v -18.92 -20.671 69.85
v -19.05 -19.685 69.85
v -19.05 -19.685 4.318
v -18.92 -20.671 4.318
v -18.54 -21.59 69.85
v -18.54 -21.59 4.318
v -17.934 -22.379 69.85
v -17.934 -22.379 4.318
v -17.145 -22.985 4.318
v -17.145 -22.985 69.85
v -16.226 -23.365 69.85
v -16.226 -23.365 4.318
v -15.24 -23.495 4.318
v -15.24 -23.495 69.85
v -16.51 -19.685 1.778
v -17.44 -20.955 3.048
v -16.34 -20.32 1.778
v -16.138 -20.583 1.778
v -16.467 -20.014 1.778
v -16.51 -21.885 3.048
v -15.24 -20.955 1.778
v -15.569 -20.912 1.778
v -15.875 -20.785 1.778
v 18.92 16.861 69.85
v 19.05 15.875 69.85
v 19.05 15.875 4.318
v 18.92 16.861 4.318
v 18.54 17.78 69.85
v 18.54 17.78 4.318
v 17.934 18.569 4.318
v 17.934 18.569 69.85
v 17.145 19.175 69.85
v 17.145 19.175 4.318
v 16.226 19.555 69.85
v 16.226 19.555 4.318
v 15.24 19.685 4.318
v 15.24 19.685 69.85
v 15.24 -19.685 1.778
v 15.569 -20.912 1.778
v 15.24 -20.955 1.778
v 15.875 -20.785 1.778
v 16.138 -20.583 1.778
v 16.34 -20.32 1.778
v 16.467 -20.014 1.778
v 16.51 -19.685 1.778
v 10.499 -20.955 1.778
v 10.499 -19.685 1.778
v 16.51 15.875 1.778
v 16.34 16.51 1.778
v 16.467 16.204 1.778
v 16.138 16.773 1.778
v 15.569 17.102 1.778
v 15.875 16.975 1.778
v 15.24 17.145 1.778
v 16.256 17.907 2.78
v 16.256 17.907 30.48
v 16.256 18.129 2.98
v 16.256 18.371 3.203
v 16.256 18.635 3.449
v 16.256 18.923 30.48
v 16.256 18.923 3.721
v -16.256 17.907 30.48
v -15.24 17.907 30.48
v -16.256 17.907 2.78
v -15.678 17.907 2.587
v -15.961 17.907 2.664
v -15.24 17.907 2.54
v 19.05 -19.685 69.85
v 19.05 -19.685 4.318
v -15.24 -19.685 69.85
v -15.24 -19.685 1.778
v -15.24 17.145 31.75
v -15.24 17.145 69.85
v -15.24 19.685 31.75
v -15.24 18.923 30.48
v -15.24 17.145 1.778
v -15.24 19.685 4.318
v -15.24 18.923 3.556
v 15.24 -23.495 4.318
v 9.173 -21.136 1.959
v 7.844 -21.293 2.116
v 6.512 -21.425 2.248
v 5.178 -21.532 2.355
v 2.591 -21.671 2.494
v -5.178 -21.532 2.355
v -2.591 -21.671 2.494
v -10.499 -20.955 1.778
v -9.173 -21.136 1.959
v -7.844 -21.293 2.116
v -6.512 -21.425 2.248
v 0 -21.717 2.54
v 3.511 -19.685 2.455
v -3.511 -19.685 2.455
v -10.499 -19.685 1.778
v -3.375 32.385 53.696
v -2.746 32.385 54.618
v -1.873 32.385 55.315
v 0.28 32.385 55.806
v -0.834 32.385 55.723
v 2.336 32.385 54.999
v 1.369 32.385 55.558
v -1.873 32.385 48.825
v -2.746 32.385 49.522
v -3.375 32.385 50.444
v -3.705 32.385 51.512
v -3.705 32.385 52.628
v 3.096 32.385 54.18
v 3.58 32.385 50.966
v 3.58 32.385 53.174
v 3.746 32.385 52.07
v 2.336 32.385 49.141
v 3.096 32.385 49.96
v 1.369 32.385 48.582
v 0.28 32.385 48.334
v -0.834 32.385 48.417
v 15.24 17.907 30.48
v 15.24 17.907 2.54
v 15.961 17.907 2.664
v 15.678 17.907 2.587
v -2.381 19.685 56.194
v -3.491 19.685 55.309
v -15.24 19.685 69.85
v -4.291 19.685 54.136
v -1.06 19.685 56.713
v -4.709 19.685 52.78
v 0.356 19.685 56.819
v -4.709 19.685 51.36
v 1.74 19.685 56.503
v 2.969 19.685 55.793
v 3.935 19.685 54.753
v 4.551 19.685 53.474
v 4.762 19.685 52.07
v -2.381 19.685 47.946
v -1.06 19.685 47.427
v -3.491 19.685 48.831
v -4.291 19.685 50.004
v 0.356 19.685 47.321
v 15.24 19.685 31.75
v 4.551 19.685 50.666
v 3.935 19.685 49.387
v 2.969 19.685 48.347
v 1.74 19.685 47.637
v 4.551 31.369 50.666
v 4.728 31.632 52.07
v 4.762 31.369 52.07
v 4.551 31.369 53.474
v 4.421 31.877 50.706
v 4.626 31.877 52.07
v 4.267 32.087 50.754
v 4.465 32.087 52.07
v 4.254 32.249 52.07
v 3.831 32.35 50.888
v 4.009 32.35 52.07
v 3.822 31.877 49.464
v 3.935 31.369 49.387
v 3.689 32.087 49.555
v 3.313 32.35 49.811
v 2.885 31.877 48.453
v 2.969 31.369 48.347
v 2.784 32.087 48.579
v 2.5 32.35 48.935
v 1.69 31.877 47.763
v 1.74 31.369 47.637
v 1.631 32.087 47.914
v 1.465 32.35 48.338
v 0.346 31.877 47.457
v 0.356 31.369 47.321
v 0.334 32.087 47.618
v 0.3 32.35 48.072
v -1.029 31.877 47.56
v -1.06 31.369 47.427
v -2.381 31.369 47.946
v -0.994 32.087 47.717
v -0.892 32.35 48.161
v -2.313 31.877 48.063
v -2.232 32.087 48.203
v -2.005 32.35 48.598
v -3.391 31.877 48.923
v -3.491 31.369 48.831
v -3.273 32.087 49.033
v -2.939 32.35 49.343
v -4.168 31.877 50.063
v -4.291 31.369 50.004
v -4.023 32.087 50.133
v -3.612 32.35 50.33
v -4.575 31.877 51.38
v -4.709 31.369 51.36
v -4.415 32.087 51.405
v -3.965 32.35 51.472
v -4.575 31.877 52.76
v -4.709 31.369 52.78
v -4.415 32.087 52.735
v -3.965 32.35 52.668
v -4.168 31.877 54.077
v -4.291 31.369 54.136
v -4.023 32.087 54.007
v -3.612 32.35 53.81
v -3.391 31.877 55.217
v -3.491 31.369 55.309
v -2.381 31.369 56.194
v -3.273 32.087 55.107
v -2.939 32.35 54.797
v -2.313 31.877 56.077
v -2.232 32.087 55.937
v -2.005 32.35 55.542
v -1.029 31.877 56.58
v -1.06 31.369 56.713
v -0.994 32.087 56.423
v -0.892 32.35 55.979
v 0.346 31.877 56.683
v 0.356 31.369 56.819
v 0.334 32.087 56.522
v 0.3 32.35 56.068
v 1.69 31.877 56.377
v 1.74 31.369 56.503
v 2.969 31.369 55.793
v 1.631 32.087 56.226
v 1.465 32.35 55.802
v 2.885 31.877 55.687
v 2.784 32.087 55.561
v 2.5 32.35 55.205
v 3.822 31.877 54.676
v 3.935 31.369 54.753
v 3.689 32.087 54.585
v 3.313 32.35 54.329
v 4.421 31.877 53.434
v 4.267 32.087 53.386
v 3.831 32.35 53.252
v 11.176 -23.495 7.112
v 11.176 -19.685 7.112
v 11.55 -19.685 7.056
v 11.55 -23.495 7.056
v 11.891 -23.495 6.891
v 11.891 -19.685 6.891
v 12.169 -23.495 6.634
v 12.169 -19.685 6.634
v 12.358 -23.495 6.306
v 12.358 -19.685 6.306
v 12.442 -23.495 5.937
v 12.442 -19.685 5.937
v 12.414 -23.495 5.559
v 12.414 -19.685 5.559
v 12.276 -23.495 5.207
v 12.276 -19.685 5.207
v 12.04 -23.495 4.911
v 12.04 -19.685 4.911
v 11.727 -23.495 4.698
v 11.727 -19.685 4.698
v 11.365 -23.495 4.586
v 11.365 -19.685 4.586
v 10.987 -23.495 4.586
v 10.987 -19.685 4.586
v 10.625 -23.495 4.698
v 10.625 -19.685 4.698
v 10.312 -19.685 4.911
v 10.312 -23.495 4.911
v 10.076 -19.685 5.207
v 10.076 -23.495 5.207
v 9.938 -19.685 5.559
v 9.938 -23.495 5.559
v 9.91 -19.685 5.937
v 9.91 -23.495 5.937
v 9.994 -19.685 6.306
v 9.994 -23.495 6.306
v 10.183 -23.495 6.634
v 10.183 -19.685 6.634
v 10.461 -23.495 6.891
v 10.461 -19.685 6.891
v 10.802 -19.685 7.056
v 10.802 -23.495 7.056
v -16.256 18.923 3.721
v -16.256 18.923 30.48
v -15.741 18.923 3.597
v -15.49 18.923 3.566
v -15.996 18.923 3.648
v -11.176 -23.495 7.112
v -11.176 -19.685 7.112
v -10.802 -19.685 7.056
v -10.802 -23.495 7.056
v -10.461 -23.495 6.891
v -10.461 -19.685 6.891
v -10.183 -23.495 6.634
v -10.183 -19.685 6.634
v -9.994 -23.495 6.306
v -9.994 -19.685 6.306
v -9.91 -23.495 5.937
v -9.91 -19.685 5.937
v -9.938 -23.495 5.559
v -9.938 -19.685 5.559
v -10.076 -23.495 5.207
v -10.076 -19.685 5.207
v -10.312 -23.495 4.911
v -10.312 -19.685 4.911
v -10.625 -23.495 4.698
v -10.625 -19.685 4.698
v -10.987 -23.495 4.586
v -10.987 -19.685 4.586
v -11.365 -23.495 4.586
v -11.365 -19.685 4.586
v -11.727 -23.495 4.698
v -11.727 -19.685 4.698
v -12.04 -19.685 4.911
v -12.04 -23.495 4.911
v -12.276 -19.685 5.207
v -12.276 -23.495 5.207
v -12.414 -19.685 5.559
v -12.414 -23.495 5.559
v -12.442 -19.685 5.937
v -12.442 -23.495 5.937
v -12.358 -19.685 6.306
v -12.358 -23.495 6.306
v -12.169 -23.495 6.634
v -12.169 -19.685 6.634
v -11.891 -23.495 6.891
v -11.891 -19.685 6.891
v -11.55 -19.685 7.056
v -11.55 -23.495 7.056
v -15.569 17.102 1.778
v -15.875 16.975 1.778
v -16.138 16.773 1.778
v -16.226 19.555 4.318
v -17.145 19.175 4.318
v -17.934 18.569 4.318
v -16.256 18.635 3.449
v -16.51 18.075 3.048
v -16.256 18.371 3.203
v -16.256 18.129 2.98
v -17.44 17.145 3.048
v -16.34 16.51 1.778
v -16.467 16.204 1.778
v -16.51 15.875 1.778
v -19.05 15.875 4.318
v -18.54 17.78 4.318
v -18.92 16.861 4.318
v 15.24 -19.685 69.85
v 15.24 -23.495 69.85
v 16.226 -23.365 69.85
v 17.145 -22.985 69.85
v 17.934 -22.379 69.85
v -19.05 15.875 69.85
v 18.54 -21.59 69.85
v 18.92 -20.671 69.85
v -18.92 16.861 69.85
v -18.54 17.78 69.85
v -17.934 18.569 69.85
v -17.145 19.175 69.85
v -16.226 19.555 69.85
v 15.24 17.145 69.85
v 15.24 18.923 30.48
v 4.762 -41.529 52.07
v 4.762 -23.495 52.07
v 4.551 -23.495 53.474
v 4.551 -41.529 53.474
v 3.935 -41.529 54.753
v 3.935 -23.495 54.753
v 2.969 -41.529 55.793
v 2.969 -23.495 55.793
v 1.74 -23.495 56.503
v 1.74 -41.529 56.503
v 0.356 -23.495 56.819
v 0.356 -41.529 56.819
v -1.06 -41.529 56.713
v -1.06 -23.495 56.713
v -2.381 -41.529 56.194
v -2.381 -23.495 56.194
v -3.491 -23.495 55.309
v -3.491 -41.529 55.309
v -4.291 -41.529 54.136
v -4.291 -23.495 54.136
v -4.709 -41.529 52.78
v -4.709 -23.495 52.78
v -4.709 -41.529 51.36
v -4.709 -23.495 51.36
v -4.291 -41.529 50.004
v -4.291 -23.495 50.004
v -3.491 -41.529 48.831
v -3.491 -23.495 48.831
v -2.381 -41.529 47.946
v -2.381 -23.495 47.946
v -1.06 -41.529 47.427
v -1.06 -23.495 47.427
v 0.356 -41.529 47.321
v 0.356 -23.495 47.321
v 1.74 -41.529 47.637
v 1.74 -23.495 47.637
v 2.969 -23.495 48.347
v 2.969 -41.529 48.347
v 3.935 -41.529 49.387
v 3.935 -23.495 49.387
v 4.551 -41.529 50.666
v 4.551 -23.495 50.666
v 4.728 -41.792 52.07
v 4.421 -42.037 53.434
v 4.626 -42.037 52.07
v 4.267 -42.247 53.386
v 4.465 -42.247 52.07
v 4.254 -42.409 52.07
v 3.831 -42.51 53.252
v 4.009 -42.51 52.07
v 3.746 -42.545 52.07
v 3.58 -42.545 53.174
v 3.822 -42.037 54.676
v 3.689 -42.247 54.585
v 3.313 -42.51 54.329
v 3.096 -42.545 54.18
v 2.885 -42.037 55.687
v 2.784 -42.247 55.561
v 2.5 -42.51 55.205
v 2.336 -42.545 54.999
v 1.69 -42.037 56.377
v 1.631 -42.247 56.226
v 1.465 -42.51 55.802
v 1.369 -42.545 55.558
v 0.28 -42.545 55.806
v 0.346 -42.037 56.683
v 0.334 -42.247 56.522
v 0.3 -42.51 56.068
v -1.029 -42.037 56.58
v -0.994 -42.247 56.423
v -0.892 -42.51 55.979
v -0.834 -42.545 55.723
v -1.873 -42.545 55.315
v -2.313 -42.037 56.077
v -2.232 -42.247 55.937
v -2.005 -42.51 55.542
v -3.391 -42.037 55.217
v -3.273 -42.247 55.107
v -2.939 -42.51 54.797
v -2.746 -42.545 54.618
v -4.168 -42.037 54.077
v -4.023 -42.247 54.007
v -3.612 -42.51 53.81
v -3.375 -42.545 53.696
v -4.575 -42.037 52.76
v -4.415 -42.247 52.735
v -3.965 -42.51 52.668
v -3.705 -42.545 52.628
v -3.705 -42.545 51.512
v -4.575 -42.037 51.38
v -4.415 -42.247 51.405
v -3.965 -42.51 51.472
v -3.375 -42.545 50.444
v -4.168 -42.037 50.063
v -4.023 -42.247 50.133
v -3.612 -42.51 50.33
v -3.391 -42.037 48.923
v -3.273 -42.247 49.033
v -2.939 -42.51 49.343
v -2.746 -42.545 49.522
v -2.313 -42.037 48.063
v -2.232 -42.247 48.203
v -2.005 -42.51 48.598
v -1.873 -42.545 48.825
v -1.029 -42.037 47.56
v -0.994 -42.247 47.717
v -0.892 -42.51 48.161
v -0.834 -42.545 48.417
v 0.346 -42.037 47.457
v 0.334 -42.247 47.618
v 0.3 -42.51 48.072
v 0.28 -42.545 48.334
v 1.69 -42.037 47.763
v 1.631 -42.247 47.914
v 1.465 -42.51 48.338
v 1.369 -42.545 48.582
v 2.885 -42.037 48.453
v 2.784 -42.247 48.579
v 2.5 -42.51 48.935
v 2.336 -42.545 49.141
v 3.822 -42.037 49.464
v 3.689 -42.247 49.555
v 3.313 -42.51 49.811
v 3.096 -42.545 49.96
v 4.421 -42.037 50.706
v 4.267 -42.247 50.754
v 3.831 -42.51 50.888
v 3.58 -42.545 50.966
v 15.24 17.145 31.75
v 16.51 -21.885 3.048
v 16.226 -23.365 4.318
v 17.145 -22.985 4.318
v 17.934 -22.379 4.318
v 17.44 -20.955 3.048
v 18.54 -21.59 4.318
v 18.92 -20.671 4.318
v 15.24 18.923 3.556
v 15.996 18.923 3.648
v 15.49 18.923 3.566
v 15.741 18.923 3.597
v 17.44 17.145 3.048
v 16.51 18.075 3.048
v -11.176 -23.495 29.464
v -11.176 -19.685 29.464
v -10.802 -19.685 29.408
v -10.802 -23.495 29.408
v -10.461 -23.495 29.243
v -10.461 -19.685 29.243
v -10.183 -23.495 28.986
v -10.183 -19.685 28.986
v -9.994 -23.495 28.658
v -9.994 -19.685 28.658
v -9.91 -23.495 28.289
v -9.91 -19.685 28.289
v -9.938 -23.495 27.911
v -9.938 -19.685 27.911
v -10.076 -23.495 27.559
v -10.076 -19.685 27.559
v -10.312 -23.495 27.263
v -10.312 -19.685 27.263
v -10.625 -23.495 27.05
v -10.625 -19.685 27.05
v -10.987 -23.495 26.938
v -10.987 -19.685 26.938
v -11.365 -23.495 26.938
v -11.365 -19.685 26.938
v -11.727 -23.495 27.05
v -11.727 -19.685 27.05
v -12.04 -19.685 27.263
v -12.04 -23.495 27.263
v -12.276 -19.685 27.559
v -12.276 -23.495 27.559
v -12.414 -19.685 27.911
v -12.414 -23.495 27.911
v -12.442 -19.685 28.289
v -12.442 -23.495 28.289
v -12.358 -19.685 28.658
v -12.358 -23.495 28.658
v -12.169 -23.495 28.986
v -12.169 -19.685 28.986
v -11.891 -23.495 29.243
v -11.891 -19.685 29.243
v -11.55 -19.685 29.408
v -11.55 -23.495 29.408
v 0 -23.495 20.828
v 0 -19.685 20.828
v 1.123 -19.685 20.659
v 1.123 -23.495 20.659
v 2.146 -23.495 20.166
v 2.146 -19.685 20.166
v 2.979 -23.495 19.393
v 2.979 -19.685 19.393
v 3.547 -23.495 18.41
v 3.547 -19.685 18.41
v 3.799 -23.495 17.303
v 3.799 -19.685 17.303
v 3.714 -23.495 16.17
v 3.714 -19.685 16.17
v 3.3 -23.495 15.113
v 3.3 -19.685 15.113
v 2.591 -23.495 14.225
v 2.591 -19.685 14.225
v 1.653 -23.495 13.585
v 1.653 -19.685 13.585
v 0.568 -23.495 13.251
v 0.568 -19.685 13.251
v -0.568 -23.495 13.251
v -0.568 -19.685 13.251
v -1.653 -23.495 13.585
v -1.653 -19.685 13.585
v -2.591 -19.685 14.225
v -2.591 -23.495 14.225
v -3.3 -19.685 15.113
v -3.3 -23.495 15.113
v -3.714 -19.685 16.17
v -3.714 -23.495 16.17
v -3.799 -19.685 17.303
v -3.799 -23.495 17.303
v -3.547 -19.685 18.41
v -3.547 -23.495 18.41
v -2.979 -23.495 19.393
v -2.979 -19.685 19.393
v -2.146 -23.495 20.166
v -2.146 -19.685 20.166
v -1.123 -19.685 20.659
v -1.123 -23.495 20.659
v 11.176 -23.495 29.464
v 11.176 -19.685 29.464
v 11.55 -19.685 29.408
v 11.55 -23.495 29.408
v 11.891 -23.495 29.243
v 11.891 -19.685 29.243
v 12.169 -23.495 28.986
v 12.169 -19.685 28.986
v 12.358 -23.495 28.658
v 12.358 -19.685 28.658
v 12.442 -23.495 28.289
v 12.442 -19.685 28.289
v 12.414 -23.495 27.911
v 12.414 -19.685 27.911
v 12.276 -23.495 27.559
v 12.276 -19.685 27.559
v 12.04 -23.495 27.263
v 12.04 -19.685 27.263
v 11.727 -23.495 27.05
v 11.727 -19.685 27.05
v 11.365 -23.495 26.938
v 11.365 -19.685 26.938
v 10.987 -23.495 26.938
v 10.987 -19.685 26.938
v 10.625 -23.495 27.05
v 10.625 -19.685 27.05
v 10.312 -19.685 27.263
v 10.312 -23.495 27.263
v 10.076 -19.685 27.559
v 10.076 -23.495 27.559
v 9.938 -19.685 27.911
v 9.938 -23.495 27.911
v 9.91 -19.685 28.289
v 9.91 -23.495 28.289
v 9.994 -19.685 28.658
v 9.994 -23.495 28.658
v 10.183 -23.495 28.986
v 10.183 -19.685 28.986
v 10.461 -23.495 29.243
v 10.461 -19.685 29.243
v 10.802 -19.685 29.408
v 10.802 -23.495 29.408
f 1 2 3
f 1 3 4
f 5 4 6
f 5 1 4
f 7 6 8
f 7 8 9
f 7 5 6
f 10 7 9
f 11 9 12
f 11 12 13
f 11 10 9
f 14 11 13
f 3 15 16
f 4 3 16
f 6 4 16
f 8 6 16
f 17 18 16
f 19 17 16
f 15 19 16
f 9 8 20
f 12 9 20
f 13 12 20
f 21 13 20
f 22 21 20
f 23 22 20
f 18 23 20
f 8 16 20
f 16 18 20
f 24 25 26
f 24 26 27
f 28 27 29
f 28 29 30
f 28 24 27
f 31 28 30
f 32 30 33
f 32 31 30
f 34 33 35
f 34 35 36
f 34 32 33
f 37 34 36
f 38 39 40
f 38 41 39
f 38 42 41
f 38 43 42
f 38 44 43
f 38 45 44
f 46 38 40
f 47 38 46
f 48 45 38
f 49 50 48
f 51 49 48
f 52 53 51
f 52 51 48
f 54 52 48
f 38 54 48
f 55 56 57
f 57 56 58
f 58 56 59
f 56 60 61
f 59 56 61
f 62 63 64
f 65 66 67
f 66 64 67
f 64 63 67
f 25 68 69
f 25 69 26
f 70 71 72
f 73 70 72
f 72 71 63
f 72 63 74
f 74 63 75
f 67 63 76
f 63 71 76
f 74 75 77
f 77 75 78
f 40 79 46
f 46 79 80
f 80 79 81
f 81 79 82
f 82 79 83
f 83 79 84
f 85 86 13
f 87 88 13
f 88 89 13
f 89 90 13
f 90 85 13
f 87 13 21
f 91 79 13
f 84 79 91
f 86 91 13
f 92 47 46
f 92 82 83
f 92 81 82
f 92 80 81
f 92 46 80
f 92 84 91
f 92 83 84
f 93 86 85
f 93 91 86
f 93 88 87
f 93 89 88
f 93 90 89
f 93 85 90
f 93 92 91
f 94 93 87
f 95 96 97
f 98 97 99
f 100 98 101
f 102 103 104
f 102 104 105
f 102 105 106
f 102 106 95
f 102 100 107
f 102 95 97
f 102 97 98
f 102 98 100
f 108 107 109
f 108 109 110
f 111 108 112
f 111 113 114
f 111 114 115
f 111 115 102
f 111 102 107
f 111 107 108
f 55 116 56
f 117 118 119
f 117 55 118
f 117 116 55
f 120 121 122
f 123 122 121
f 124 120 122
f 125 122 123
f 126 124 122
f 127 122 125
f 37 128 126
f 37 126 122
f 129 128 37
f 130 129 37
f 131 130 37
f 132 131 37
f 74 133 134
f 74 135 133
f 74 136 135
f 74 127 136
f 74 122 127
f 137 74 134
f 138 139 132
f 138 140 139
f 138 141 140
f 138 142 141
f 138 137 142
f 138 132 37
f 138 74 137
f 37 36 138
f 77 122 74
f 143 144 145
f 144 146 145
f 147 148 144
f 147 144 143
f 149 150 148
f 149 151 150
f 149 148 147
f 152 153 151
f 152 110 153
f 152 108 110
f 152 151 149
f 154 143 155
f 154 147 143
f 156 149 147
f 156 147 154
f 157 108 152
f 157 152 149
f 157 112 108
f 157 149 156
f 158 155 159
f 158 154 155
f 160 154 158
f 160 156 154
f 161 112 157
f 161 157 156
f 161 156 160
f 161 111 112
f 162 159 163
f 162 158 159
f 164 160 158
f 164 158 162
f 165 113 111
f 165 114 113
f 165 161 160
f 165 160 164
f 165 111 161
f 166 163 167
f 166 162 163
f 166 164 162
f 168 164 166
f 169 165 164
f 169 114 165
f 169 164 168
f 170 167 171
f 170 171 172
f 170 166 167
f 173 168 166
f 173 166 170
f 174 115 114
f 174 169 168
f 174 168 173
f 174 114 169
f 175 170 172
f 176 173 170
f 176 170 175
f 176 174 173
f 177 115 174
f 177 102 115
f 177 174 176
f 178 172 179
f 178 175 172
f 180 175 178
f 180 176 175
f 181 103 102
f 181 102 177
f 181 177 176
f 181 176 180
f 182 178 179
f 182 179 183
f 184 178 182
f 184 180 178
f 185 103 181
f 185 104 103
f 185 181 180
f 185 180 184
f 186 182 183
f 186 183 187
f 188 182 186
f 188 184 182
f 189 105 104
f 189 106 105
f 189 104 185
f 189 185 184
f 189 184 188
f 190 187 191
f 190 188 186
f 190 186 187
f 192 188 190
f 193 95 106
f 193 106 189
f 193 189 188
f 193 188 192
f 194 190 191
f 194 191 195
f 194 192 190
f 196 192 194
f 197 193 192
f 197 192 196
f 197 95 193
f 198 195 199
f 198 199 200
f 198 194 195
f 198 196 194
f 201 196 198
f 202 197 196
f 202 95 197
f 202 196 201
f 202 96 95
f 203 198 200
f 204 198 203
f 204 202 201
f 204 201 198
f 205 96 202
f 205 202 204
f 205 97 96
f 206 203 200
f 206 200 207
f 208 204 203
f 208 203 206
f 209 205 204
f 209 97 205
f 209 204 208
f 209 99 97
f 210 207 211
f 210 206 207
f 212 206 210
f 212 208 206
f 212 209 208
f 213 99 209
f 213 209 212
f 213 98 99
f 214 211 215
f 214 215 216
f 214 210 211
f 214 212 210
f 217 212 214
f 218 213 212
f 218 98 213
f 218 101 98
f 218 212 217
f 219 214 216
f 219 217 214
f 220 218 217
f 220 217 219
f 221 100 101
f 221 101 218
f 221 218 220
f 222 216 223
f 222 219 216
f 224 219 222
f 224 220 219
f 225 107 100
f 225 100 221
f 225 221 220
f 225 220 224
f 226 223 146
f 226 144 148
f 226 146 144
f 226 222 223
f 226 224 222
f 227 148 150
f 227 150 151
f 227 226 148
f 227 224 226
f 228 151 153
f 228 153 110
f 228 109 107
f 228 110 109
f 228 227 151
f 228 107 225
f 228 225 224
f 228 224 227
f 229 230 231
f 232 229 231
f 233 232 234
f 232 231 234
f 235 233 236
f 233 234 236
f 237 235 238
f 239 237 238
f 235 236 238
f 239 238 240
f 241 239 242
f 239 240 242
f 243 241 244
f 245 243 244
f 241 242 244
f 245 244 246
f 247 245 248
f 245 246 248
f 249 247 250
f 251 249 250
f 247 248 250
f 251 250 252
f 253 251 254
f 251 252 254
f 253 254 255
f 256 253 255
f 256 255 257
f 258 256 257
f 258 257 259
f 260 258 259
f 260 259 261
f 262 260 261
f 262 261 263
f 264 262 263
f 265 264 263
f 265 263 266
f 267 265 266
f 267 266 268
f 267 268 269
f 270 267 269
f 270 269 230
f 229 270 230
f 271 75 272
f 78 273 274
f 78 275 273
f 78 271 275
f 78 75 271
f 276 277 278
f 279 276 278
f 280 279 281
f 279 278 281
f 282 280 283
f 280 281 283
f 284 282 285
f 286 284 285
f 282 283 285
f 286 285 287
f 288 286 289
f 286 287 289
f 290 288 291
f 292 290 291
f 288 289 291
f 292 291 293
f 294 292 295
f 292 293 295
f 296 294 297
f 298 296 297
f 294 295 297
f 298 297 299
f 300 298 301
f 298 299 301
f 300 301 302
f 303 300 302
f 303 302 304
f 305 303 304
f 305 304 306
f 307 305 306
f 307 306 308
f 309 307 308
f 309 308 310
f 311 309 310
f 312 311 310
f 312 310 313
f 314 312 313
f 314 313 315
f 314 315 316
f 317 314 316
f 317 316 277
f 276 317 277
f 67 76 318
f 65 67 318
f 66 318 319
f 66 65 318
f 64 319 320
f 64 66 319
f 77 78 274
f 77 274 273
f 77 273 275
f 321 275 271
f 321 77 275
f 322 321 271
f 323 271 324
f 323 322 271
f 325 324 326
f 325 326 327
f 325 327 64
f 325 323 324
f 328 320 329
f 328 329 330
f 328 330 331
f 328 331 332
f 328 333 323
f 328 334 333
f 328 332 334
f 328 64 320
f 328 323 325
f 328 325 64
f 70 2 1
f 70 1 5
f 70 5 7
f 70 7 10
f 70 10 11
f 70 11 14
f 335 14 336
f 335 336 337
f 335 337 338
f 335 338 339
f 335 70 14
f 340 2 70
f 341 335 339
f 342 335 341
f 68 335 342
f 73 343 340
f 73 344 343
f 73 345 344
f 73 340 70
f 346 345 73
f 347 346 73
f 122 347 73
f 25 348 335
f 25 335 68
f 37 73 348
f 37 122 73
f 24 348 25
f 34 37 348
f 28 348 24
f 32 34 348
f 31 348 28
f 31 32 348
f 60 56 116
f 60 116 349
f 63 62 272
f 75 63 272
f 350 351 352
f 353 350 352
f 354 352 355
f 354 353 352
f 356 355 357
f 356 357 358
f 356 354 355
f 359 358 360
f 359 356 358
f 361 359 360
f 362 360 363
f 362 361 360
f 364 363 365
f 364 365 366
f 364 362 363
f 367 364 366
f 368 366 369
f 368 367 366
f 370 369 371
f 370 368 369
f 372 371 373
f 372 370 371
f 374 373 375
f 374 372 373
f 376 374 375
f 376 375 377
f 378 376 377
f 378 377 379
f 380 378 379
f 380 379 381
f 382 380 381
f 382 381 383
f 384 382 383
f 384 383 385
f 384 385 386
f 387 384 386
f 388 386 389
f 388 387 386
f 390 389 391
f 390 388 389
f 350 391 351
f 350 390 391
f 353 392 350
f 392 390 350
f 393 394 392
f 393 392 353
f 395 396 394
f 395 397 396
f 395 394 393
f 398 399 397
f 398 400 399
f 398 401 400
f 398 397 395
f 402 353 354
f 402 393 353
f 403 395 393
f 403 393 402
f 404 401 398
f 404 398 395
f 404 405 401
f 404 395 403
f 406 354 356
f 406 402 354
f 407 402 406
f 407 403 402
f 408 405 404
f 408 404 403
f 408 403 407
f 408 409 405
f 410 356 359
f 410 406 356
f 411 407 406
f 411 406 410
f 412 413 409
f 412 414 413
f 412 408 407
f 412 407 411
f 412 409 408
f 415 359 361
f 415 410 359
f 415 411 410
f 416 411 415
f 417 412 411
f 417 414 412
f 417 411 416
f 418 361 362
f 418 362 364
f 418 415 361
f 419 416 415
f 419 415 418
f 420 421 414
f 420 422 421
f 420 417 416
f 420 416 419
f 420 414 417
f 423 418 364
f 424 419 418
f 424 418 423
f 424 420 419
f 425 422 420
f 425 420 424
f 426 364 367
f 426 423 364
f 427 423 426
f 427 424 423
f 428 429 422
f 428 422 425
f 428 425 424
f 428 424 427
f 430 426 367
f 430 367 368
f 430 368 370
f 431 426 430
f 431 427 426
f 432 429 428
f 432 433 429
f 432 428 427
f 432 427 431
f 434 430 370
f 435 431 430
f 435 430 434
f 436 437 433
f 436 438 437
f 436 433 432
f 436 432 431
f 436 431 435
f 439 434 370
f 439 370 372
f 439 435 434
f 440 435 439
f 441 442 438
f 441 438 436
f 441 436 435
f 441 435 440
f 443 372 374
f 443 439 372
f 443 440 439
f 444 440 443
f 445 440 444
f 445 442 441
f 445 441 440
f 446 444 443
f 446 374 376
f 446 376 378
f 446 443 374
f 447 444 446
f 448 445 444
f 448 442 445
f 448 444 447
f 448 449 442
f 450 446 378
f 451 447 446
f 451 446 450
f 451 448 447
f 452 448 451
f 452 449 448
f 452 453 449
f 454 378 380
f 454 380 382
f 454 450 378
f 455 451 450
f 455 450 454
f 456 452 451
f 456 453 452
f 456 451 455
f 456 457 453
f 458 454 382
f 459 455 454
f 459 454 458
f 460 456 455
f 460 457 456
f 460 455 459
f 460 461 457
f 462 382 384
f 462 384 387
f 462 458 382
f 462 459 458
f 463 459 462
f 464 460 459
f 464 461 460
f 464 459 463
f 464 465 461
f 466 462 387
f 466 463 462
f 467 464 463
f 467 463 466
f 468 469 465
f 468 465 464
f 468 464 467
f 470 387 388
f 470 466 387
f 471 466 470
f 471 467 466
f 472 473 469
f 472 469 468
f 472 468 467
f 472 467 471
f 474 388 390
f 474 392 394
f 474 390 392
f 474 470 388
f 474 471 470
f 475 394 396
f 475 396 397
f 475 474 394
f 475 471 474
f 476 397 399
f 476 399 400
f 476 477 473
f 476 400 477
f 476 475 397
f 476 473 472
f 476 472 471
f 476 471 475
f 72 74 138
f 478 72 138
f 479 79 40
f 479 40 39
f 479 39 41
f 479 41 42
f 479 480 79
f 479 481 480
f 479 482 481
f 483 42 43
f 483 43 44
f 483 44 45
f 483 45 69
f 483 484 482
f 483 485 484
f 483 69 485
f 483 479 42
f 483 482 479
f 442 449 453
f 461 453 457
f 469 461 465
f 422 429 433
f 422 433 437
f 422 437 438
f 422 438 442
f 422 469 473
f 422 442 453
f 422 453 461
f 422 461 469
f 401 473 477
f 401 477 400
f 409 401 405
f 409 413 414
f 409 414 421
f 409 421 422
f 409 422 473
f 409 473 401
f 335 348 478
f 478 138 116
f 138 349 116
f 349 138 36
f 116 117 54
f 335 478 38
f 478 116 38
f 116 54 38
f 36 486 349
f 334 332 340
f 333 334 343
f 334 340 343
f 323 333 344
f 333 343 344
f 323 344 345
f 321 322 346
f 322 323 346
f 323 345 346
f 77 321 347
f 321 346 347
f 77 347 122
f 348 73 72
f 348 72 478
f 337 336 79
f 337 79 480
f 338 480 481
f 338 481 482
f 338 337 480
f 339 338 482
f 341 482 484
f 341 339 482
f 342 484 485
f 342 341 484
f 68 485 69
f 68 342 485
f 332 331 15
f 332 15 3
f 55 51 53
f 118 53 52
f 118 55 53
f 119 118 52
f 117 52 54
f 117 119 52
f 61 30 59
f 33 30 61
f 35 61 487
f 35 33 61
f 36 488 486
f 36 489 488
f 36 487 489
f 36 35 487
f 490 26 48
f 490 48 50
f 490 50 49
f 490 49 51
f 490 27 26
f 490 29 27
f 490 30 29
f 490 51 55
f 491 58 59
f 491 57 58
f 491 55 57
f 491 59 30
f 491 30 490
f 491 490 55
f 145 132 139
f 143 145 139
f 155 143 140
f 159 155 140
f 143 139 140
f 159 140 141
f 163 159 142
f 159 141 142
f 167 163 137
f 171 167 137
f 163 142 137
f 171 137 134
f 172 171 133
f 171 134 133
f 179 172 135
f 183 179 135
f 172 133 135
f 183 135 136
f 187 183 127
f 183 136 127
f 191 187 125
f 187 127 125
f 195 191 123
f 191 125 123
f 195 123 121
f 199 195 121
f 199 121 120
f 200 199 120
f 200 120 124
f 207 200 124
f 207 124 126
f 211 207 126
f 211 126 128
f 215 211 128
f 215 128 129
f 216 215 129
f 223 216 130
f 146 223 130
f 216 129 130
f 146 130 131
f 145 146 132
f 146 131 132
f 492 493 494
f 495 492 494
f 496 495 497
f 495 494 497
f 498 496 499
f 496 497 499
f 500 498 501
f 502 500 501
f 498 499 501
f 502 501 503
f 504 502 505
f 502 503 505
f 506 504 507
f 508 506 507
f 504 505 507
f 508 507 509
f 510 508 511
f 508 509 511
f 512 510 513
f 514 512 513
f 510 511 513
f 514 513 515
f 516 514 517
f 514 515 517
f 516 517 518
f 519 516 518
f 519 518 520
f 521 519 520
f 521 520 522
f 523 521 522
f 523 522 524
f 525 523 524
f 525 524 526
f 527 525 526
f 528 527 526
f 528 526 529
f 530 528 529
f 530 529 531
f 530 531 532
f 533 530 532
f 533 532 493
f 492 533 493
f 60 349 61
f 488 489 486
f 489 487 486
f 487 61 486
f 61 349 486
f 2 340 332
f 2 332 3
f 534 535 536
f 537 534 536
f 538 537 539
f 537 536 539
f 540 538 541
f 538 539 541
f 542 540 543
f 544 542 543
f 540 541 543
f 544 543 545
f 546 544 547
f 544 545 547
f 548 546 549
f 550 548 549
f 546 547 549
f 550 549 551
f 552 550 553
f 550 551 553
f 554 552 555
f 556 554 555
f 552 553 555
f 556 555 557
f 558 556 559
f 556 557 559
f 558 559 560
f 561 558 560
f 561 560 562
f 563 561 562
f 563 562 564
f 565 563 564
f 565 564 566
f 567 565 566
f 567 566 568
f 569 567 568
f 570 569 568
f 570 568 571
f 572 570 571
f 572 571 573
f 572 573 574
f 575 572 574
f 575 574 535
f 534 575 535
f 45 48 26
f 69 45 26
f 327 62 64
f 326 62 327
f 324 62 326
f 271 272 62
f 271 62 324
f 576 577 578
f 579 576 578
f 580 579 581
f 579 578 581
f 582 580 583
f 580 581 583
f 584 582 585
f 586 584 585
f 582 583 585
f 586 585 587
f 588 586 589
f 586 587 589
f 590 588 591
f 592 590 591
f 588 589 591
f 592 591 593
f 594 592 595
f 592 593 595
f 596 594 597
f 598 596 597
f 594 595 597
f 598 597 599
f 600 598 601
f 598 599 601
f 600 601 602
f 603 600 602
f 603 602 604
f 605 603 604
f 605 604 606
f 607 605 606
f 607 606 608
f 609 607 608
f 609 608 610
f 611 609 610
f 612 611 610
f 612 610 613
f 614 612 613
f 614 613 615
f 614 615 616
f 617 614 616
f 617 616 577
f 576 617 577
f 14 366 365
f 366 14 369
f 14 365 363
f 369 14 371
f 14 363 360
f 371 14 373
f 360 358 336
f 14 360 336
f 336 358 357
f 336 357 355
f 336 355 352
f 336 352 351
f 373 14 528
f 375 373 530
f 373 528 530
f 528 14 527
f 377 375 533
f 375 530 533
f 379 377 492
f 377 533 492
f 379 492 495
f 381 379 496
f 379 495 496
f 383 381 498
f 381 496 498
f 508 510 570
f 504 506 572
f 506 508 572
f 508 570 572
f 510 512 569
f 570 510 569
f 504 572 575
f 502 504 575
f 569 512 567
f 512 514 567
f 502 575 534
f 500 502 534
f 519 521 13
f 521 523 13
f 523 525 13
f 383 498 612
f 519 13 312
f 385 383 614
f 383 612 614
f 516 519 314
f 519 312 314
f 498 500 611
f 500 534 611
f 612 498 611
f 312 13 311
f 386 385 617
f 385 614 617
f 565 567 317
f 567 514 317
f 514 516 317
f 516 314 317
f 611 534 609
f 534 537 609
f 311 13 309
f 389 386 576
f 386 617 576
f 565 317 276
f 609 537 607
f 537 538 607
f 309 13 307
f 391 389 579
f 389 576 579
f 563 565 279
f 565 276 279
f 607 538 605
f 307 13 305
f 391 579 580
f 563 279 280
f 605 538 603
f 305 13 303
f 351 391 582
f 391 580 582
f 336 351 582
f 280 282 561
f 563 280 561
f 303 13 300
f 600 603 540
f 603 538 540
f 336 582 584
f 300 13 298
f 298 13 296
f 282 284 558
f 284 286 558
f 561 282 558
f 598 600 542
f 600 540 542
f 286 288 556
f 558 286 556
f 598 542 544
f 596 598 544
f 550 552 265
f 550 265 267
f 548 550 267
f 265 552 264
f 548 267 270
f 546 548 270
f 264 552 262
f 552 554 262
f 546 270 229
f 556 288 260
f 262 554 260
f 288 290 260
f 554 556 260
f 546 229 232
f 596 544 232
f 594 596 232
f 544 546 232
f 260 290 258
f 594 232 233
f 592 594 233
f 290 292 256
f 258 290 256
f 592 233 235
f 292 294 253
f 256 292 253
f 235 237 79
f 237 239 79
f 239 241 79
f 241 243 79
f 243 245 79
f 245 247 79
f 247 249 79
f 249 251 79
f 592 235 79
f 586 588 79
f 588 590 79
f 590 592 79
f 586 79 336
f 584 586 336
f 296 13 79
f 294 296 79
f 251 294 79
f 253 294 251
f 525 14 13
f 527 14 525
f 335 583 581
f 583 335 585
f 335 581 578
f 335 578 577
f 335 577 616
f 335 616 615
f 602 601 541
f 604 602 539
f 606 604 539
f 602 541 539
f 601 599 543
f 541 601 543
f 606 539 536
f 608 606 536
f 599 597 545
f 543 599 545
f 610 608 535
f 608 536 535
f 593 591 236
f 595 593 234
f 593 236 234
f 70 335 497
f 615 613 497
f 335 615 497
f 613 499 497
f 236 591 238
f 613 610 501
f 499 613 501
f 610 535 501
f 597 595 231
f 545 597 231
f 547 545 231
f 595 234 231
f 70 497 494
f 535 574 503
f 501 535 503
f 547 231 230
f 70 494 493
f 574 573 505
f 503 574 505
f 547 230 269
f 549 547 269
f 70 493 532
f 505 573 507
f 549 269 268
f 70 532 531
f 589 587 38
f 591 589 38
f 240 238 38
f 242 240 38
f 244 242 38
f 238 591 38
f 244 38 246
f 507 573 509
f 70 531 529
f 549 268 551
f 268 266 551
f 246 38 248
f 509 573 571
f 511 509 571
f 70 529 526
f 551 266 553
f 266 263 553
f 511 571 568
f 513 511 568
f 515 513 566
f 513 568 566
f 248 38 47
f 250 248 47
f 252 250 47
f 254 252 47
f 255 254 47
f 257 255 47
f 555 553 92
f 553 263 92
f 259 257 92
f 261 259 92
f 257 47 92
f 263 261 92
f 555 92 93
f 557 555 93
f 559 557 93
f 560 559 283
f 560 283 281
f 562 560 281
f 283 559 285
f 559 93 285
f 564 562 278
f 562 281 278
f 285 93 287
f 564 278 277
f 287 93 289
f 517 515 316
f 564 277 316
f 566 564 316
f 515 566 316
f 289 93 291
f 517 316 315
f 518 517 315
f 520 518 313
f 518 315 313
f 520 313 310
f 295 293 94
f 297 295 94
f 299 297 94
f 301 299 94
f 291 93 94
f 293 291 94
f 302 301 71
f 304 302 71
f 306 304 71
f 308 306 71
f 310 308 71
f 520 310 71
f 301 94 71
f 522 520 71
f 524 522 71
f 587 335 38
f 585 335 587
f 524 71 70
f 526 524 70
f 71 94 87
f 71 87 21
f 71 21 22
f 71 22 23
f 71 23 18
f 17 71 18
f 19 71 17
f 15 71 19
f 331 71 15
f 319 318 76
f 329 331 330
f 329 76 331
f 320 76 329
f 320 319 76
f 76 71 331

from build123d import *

# Parameters (mm, degrees)
BOSS_EXTRUDE1_DEPTH = 69.85
CUT_EXTRUDE1_DEPTH  = 50.8
SKETCH3_R           = 1.27
SKETCH3_R_2         = 3.81
CUT_EXTRUDE2_DEPTH  = 50.8
SKETCH4_W           = 30.48
SKETCH4_H           = 38.1
BOSS_EXTRUDE2_DEPTH = 2.54
SKETCH5_W           = 30.48
SKETCH5_H           = 1.016
CUT_EXTRUDE3_DEPTH  = 1.016
FILLET1_R           = 3.81
SKETCH6_R           = 4.7625
BOSS_EXTRUDE3_DEPTH = 12.7
BOSS_EXTRUDE4_START = 19.05
SKETCH8_R           = 4.7625
BOSS_EXTRUDE4_DEPTH = 19.05
FILLET2_R           = 1.016
SKETCH9_W           = 38.1
SKETCH9_H           = 43.18
CUT_EXTRUDE4_DEPTH  = 2.032


# Some blends are built 0.0001 mm under size
with BuildPart() as part:
    # Sketch1 → Boss-Extrude1 (new body)
    with BuildSketch(Plane.XY):
        Polygon((15.24, -19.685), (-15.24, -19.685), (-15.24, 19.685), (-19.05, 19.685), (-19.05, -23.495), (15.24, -23.495), (19.05, -23.495), (19.05, 19.685), (15.24, 19.685), align=None)
    extrude(amount=BOSS_EXTRUDE1_DEPTH)

    # Sketch2 → Cut-Extrude1 (cut)
    with BuildSketch(Plane(origin=(0, 19.685, 0), x_dir=(1, 0, 0), z_dir=(0, 1, 0))):
        with BuildLine():
            Line((-19.05, 0), (19.05, 0))
            ThreePointArc((19.05, 0), (0, -2.54), (-19.05, 0))
        make_face()
    extrude(amount=-CUT_EXTRUDE1_DEPTH, mode=Mode.SUBTRACT)

    # Sketch3 → Cut-Extrude2 (cut)
    with BuildSketch(Plane(origin=(0, 19.685, 0), x_dir=(1, 0, 0), z_dir=(0, 1, 0))):
        with Locations(Location((-11.176, -5.842, 0), (0, 0, 270))):
            Circle(SKETCH3_R)
        with Locations(Location((11.176, -5.842, 0), (0, 0, 270))):
            Circle(SKETCH3_R)
        with Locations(Location((11.176, -28.194, 0), (0, 0, 270))):
            Circle(SKETCH3_R)
        with Locations(Location((-11.176, -28.194, 0), (0, 0, 270))):
            Circle(SKETCH3_R)
        with Locations(Location((0, -17.018, 0), (0, 0, 270))):
            Circle(SKETCH3_R_2)
    extrude(amount=-CUT_EXTRUDE2_DEPTH, mode=Mode.SUBTRACT)

    # Sketch4 → Boss-Extrude2 (add)
    with BuildSketch(Plane(origin=(0, 19.685, 0), x_dir=(1, 0, 0), z_dir=(0, 1, 0))):
        with Locations((0, -50.8)):
            Rectangle(SKETCH4_W, SKETCH4_H)
    extrude(amount=-BOSS_EXTRUDE2_DEPTH)

    # Sketch5 → Cut-Extrude3 (cut)
    with BuildSketch(Plane(origin=(-15.24, 0, 0), x_dir=(0, 0, -1), z_dir=(1, 0, 0))):
        with Locations((-15.24, 18.415)):
            Rectangle(SKETCH5_W, SKETCH5_H)
    cut_extrude3 = extrude(amount=-CUT_EXTRUDE3_DEPTH, mode=Mode.SUBTRACT)

    # Mirror1: Cut-Extrude3 across plane
    add(cut_extrude3.mirror(Plane(origin=(0, 0, 0), x_dir=(0, 0, 1), z_dir=(1, 0, 0))), mode=Mode.SUBTRACT)

    # Fillet1
    fillet1_edges = [part.edges().sort_by_distance(p)[0] for p in [
        (19.05, 19.685, 34.925),
        (19.05, -23.495, 34.925),
        (-19.05, -23.495, 34.925),
        (-19.05, 19.685, 34.925),
    ]]
    fillet(fillet1_edges, radius=FILLET1_R - 0.0001)  # a hair under: the kernel refuses the full size

    # Sketch6 → Boss-Extrude3 (add)
    with BuildSketch(Plane(origin=(0, 19.685, 0), x_dir=(1, 0, 0), z_dir=(0, 1, 0))):
        with Locations((0, -52.07)):
            Circle(SKETCH6_R)
    extrude(amount=BOSS_EXTRUDE3_DEPTH)

    # Sketch8 → Boss-Extrude4 (add)
    with BuildSketch(Plane.XZ.offset(23.495).offset(BOSS_EXTRUDE4_START)):
        with Locations((0, 52.07)):
            Circle(SKETCH8_R)
    extrude(amount=-BOSS_EXTRUDE4_DEPTH)

    # Fillet2
    fillet2_edges = [part.edges().sort_by_distance(p)[0] for p in [
        (-4.7625, 32.385, 52.07),
        (-4.7625, -42.545, 52.07),
    ]]
    fillet(fillet2_edges, radius=FILLET2_R)

    # Sketch9 → Cut-Extrude4 (cut)
    with BuildSketch(Plane(origin=(0, 0, 1.778), x_dir=(-1, 0, 0), z_dir=(0, 0, -1))):
        with Locations((0, -1.905)):
            Rectangle(SKETCH9_W, SKETCH9_H)
    extrude(amount=CUT_EXTRUDE4_DEPTH, mode=Mode.SUBTRACT)

    # Chamfer1
    # the kernel refuses this chamfer: 2.54 mm, written as the material it takes off along each edge
    with BuildSketch(Plane(origin=(-15.2401, 15.8751, 1.778), x_dir=(0, 1, 0), z_dir=(1, 0, 0))) as chamfer1_piece_1:
        with BuildLine():
            Line((1.198057951, -0.071842049), (3.881742049, 2.611842049))
            Line((3.881742049, 2.611842049), (3.932542049, 2.611842049))
            ThreePointArc((3.932542049, 2.611842049), (3.8607, 1.305921024), (3.8607, 0))
            Line((3.8607, 0), (3.8099, -0.0508))
            ThreePointArc((3.8099, -0.0508), (2.503978976, -0.0508), (1.198057951, -0.122642049))
            Line((1.198057951, -0.122642049), (1.198057951, -0.071842049))
        make_face()
    revolve(axis=Axis((-15.2401, 15.8751, 1.778), (0, 0, 1)), revolution_arc=90, mode=Mode.SUBTRACT)
    with BuildSketch(Plane(origin=(-15.2401, -19.6851, 1.778), x_dir=(-1, 0, 0), z_dir=(0, 1, 0))) as chamfer1_piece_2:
        with BuildLine():
            Line((3.881742049, 2.611842049), (1.198057951, -0.071842049))
            Line((1.198057951, -0.071842049), (1.198057951, -0.122642049))
            ThreePointArc((1.198057951, -0.122642049), (2.503978976, -0.0508), (3.8099, -0.0508))
            Line((3.8099, -0.0508), (3.8607, 0))
            ThreePointArc((3.8607, 0), (3.8607, 1.305921024), (3.932542049, 2.611842049))
            Line((3.932542049, 2.611842049), (3.881742049, 2.611842049))
        make_face()
    revolve(axis=Axis((-15.2401, -19.6851, 1.778), (0, 0, 1)), revolution_arc=90, mode=Mode.SUBTRACT)
    with BuildSketch(Plane(origin=(-19.05, 15.8751, 1.778), x_dir=(1, 0, 0), z_dir=(0, -1, 0)), Plane(origin=(19.05, -19.6851, 1.778), x_dir=(-1, 0, 0), z_dir=(0, 1, 0))) as chamfer1_piece_3:
        with BuildLine():
            Line((2.611842049, -0.071842049), (-0.071842049, 2.611842049))
            Line((-0.071842049, 2.611842049), (-0.122642049, 2.611842049))
            ThreePointArc((-0.122642049, 2.611842049), (-0.0508, 1.305921024), (-0.0508, 0))
            Line((-0.0508, 0), (0, -0.0508))
            ThreePointArc((0, -0.0508), (1.305921024, -0.0508), (2.611842049, -0.122642049))
            Line((2.611842049, -0.122642049), (2.611842049, -0.071842049))
        make_face()
    extrude(amount=35.5602, mode=Mode.SUBTRACT)
    with BuildSketch(Plane(origin=(-5.17814213, -23.495, 1.778), x_dir=(0, 0, 1), z_dir=(1, 0, 0)), Plane(origin=(-15.2401, -23.495, 1.778), x_dir=(0, 0, 1), z_dir=(1, 0, 0))) as chamfer1_piece_4:
        with BuildLine():
            Line((2.611842049, 0.071842049), (-0.071842049, -2.611842049))
            Line((-0.071842049, -2.611842049), (-0.122642049, -2.611842049))
            ThreePointArc((-0.122642049, -2.611842049), (-0.0508, -1.305921024), (-0.0508, 0))
            Line((-0.0508, 0), (0, 0.0508))
            ThreePointArc((0, 0.0508), (1.305921024, 0.0508), (2.611842049, 0.122642049))
            Line((2.611842049, 0.122642049), (2.611842049, 0.071842049))
        make_face()
    extrude(amount=20.41824213, mode=Mode.SUBTRACT)
    with BuildSketch(Plane(origin=(15.2401, 15.8751, 1.778), x_dir=(1, 0, 0), z_dir=(0, -1, 0))) as chamfer1_piece_5:
        with BuildLine():
            Line((1.198057951, -0.071842049), (3.881742049, 2.611842049))
            Line((3.881742049, 2.611842049), (3.932542049, 2.611842049))
            ThreePointArc((3.932542049, 2.611842049), (3.8607, 1.305921024), (3.8607, 0))
            Line((3.8607, 0), (3.8099, -0.0508))
            ThreePointArc((3.8099, -0.0508), (2.503978976, -0.0508), (1.198057951, -0.122642049))
            Line((1.198057951, -0.122642049), (1.198057951, -0.071842049))
        make_face()
    revolve(axis=Axis((15.2401, 15.8751, 1.778), (0, 0, 1)), revolution_arc=90, mode=Mode.SUBTRACT)
    with BuildSketch(Plane(origin=(15.2401, -19.6851, 1.778), x_dir=(0, -1, 0), z_dir=(-1, 0, 0))) as chamfer1_piece_6:
        with BuildLine():
            Line((1.198057951, -0.071842049), (3.881742049, 2.611842049))
            Line((3.881742049, 2.611842049), (3.932542049, 2.611842049))
            ThreePointArc((3.932542049, 2.611842049), (3.8607, 1.305921024), (3.8607, 0))
            Line((3.8607, 0), (3.8099, -0.0508))
            ThreePointArc((3.8099, -0.0508), (2.503978976, -0.0508), (1.198057951, -0.122642049))
            Line((1.198057951, -0.122642049), (1.198057951, -0.071842049))
        make_face()
    revolve(axis=Axis((15.2401, -19.6851, 1.778), (0, 0, 1)), revolution_arc=90, mode=Mode.SUBTRACT)
    with BuildSketch(Plane(origin=(15.2401, 19.685, 1.778), x_dir=(0, -1, 0), z_dir=(-1, 0, 0)), Plane(origin=(0.436979495, 19.685, 1.778), x_dir=(0, -1, 0), z_dir=(-1, 0, 0))) as chamfer1_piece_7:
        with BuildLine():
            Line((2.611842049, -0.071842049), (-0.071842049, 2.611842049))
            Line((-0.071842049, 2.611842049), (-0.122642049, 2.611842049))
            ThreePointArc((-0.122642049, 2.611842049), (-0.0508, 1.305921024), (-0.0508, 0))
            Line((-0.0508, 0), (0, -0.0508))
            ThreePointArc((0, -0.0508), (1.305921024, -0.0508), (2.611842049, -0.122642049))
            Line((2.611842049, -0.122642049), (2.611842049, -0.071842049))
        make_face()
    extrude(amount=15.677079495, mode=Mode.SUBTRACT)


solid = part.part
